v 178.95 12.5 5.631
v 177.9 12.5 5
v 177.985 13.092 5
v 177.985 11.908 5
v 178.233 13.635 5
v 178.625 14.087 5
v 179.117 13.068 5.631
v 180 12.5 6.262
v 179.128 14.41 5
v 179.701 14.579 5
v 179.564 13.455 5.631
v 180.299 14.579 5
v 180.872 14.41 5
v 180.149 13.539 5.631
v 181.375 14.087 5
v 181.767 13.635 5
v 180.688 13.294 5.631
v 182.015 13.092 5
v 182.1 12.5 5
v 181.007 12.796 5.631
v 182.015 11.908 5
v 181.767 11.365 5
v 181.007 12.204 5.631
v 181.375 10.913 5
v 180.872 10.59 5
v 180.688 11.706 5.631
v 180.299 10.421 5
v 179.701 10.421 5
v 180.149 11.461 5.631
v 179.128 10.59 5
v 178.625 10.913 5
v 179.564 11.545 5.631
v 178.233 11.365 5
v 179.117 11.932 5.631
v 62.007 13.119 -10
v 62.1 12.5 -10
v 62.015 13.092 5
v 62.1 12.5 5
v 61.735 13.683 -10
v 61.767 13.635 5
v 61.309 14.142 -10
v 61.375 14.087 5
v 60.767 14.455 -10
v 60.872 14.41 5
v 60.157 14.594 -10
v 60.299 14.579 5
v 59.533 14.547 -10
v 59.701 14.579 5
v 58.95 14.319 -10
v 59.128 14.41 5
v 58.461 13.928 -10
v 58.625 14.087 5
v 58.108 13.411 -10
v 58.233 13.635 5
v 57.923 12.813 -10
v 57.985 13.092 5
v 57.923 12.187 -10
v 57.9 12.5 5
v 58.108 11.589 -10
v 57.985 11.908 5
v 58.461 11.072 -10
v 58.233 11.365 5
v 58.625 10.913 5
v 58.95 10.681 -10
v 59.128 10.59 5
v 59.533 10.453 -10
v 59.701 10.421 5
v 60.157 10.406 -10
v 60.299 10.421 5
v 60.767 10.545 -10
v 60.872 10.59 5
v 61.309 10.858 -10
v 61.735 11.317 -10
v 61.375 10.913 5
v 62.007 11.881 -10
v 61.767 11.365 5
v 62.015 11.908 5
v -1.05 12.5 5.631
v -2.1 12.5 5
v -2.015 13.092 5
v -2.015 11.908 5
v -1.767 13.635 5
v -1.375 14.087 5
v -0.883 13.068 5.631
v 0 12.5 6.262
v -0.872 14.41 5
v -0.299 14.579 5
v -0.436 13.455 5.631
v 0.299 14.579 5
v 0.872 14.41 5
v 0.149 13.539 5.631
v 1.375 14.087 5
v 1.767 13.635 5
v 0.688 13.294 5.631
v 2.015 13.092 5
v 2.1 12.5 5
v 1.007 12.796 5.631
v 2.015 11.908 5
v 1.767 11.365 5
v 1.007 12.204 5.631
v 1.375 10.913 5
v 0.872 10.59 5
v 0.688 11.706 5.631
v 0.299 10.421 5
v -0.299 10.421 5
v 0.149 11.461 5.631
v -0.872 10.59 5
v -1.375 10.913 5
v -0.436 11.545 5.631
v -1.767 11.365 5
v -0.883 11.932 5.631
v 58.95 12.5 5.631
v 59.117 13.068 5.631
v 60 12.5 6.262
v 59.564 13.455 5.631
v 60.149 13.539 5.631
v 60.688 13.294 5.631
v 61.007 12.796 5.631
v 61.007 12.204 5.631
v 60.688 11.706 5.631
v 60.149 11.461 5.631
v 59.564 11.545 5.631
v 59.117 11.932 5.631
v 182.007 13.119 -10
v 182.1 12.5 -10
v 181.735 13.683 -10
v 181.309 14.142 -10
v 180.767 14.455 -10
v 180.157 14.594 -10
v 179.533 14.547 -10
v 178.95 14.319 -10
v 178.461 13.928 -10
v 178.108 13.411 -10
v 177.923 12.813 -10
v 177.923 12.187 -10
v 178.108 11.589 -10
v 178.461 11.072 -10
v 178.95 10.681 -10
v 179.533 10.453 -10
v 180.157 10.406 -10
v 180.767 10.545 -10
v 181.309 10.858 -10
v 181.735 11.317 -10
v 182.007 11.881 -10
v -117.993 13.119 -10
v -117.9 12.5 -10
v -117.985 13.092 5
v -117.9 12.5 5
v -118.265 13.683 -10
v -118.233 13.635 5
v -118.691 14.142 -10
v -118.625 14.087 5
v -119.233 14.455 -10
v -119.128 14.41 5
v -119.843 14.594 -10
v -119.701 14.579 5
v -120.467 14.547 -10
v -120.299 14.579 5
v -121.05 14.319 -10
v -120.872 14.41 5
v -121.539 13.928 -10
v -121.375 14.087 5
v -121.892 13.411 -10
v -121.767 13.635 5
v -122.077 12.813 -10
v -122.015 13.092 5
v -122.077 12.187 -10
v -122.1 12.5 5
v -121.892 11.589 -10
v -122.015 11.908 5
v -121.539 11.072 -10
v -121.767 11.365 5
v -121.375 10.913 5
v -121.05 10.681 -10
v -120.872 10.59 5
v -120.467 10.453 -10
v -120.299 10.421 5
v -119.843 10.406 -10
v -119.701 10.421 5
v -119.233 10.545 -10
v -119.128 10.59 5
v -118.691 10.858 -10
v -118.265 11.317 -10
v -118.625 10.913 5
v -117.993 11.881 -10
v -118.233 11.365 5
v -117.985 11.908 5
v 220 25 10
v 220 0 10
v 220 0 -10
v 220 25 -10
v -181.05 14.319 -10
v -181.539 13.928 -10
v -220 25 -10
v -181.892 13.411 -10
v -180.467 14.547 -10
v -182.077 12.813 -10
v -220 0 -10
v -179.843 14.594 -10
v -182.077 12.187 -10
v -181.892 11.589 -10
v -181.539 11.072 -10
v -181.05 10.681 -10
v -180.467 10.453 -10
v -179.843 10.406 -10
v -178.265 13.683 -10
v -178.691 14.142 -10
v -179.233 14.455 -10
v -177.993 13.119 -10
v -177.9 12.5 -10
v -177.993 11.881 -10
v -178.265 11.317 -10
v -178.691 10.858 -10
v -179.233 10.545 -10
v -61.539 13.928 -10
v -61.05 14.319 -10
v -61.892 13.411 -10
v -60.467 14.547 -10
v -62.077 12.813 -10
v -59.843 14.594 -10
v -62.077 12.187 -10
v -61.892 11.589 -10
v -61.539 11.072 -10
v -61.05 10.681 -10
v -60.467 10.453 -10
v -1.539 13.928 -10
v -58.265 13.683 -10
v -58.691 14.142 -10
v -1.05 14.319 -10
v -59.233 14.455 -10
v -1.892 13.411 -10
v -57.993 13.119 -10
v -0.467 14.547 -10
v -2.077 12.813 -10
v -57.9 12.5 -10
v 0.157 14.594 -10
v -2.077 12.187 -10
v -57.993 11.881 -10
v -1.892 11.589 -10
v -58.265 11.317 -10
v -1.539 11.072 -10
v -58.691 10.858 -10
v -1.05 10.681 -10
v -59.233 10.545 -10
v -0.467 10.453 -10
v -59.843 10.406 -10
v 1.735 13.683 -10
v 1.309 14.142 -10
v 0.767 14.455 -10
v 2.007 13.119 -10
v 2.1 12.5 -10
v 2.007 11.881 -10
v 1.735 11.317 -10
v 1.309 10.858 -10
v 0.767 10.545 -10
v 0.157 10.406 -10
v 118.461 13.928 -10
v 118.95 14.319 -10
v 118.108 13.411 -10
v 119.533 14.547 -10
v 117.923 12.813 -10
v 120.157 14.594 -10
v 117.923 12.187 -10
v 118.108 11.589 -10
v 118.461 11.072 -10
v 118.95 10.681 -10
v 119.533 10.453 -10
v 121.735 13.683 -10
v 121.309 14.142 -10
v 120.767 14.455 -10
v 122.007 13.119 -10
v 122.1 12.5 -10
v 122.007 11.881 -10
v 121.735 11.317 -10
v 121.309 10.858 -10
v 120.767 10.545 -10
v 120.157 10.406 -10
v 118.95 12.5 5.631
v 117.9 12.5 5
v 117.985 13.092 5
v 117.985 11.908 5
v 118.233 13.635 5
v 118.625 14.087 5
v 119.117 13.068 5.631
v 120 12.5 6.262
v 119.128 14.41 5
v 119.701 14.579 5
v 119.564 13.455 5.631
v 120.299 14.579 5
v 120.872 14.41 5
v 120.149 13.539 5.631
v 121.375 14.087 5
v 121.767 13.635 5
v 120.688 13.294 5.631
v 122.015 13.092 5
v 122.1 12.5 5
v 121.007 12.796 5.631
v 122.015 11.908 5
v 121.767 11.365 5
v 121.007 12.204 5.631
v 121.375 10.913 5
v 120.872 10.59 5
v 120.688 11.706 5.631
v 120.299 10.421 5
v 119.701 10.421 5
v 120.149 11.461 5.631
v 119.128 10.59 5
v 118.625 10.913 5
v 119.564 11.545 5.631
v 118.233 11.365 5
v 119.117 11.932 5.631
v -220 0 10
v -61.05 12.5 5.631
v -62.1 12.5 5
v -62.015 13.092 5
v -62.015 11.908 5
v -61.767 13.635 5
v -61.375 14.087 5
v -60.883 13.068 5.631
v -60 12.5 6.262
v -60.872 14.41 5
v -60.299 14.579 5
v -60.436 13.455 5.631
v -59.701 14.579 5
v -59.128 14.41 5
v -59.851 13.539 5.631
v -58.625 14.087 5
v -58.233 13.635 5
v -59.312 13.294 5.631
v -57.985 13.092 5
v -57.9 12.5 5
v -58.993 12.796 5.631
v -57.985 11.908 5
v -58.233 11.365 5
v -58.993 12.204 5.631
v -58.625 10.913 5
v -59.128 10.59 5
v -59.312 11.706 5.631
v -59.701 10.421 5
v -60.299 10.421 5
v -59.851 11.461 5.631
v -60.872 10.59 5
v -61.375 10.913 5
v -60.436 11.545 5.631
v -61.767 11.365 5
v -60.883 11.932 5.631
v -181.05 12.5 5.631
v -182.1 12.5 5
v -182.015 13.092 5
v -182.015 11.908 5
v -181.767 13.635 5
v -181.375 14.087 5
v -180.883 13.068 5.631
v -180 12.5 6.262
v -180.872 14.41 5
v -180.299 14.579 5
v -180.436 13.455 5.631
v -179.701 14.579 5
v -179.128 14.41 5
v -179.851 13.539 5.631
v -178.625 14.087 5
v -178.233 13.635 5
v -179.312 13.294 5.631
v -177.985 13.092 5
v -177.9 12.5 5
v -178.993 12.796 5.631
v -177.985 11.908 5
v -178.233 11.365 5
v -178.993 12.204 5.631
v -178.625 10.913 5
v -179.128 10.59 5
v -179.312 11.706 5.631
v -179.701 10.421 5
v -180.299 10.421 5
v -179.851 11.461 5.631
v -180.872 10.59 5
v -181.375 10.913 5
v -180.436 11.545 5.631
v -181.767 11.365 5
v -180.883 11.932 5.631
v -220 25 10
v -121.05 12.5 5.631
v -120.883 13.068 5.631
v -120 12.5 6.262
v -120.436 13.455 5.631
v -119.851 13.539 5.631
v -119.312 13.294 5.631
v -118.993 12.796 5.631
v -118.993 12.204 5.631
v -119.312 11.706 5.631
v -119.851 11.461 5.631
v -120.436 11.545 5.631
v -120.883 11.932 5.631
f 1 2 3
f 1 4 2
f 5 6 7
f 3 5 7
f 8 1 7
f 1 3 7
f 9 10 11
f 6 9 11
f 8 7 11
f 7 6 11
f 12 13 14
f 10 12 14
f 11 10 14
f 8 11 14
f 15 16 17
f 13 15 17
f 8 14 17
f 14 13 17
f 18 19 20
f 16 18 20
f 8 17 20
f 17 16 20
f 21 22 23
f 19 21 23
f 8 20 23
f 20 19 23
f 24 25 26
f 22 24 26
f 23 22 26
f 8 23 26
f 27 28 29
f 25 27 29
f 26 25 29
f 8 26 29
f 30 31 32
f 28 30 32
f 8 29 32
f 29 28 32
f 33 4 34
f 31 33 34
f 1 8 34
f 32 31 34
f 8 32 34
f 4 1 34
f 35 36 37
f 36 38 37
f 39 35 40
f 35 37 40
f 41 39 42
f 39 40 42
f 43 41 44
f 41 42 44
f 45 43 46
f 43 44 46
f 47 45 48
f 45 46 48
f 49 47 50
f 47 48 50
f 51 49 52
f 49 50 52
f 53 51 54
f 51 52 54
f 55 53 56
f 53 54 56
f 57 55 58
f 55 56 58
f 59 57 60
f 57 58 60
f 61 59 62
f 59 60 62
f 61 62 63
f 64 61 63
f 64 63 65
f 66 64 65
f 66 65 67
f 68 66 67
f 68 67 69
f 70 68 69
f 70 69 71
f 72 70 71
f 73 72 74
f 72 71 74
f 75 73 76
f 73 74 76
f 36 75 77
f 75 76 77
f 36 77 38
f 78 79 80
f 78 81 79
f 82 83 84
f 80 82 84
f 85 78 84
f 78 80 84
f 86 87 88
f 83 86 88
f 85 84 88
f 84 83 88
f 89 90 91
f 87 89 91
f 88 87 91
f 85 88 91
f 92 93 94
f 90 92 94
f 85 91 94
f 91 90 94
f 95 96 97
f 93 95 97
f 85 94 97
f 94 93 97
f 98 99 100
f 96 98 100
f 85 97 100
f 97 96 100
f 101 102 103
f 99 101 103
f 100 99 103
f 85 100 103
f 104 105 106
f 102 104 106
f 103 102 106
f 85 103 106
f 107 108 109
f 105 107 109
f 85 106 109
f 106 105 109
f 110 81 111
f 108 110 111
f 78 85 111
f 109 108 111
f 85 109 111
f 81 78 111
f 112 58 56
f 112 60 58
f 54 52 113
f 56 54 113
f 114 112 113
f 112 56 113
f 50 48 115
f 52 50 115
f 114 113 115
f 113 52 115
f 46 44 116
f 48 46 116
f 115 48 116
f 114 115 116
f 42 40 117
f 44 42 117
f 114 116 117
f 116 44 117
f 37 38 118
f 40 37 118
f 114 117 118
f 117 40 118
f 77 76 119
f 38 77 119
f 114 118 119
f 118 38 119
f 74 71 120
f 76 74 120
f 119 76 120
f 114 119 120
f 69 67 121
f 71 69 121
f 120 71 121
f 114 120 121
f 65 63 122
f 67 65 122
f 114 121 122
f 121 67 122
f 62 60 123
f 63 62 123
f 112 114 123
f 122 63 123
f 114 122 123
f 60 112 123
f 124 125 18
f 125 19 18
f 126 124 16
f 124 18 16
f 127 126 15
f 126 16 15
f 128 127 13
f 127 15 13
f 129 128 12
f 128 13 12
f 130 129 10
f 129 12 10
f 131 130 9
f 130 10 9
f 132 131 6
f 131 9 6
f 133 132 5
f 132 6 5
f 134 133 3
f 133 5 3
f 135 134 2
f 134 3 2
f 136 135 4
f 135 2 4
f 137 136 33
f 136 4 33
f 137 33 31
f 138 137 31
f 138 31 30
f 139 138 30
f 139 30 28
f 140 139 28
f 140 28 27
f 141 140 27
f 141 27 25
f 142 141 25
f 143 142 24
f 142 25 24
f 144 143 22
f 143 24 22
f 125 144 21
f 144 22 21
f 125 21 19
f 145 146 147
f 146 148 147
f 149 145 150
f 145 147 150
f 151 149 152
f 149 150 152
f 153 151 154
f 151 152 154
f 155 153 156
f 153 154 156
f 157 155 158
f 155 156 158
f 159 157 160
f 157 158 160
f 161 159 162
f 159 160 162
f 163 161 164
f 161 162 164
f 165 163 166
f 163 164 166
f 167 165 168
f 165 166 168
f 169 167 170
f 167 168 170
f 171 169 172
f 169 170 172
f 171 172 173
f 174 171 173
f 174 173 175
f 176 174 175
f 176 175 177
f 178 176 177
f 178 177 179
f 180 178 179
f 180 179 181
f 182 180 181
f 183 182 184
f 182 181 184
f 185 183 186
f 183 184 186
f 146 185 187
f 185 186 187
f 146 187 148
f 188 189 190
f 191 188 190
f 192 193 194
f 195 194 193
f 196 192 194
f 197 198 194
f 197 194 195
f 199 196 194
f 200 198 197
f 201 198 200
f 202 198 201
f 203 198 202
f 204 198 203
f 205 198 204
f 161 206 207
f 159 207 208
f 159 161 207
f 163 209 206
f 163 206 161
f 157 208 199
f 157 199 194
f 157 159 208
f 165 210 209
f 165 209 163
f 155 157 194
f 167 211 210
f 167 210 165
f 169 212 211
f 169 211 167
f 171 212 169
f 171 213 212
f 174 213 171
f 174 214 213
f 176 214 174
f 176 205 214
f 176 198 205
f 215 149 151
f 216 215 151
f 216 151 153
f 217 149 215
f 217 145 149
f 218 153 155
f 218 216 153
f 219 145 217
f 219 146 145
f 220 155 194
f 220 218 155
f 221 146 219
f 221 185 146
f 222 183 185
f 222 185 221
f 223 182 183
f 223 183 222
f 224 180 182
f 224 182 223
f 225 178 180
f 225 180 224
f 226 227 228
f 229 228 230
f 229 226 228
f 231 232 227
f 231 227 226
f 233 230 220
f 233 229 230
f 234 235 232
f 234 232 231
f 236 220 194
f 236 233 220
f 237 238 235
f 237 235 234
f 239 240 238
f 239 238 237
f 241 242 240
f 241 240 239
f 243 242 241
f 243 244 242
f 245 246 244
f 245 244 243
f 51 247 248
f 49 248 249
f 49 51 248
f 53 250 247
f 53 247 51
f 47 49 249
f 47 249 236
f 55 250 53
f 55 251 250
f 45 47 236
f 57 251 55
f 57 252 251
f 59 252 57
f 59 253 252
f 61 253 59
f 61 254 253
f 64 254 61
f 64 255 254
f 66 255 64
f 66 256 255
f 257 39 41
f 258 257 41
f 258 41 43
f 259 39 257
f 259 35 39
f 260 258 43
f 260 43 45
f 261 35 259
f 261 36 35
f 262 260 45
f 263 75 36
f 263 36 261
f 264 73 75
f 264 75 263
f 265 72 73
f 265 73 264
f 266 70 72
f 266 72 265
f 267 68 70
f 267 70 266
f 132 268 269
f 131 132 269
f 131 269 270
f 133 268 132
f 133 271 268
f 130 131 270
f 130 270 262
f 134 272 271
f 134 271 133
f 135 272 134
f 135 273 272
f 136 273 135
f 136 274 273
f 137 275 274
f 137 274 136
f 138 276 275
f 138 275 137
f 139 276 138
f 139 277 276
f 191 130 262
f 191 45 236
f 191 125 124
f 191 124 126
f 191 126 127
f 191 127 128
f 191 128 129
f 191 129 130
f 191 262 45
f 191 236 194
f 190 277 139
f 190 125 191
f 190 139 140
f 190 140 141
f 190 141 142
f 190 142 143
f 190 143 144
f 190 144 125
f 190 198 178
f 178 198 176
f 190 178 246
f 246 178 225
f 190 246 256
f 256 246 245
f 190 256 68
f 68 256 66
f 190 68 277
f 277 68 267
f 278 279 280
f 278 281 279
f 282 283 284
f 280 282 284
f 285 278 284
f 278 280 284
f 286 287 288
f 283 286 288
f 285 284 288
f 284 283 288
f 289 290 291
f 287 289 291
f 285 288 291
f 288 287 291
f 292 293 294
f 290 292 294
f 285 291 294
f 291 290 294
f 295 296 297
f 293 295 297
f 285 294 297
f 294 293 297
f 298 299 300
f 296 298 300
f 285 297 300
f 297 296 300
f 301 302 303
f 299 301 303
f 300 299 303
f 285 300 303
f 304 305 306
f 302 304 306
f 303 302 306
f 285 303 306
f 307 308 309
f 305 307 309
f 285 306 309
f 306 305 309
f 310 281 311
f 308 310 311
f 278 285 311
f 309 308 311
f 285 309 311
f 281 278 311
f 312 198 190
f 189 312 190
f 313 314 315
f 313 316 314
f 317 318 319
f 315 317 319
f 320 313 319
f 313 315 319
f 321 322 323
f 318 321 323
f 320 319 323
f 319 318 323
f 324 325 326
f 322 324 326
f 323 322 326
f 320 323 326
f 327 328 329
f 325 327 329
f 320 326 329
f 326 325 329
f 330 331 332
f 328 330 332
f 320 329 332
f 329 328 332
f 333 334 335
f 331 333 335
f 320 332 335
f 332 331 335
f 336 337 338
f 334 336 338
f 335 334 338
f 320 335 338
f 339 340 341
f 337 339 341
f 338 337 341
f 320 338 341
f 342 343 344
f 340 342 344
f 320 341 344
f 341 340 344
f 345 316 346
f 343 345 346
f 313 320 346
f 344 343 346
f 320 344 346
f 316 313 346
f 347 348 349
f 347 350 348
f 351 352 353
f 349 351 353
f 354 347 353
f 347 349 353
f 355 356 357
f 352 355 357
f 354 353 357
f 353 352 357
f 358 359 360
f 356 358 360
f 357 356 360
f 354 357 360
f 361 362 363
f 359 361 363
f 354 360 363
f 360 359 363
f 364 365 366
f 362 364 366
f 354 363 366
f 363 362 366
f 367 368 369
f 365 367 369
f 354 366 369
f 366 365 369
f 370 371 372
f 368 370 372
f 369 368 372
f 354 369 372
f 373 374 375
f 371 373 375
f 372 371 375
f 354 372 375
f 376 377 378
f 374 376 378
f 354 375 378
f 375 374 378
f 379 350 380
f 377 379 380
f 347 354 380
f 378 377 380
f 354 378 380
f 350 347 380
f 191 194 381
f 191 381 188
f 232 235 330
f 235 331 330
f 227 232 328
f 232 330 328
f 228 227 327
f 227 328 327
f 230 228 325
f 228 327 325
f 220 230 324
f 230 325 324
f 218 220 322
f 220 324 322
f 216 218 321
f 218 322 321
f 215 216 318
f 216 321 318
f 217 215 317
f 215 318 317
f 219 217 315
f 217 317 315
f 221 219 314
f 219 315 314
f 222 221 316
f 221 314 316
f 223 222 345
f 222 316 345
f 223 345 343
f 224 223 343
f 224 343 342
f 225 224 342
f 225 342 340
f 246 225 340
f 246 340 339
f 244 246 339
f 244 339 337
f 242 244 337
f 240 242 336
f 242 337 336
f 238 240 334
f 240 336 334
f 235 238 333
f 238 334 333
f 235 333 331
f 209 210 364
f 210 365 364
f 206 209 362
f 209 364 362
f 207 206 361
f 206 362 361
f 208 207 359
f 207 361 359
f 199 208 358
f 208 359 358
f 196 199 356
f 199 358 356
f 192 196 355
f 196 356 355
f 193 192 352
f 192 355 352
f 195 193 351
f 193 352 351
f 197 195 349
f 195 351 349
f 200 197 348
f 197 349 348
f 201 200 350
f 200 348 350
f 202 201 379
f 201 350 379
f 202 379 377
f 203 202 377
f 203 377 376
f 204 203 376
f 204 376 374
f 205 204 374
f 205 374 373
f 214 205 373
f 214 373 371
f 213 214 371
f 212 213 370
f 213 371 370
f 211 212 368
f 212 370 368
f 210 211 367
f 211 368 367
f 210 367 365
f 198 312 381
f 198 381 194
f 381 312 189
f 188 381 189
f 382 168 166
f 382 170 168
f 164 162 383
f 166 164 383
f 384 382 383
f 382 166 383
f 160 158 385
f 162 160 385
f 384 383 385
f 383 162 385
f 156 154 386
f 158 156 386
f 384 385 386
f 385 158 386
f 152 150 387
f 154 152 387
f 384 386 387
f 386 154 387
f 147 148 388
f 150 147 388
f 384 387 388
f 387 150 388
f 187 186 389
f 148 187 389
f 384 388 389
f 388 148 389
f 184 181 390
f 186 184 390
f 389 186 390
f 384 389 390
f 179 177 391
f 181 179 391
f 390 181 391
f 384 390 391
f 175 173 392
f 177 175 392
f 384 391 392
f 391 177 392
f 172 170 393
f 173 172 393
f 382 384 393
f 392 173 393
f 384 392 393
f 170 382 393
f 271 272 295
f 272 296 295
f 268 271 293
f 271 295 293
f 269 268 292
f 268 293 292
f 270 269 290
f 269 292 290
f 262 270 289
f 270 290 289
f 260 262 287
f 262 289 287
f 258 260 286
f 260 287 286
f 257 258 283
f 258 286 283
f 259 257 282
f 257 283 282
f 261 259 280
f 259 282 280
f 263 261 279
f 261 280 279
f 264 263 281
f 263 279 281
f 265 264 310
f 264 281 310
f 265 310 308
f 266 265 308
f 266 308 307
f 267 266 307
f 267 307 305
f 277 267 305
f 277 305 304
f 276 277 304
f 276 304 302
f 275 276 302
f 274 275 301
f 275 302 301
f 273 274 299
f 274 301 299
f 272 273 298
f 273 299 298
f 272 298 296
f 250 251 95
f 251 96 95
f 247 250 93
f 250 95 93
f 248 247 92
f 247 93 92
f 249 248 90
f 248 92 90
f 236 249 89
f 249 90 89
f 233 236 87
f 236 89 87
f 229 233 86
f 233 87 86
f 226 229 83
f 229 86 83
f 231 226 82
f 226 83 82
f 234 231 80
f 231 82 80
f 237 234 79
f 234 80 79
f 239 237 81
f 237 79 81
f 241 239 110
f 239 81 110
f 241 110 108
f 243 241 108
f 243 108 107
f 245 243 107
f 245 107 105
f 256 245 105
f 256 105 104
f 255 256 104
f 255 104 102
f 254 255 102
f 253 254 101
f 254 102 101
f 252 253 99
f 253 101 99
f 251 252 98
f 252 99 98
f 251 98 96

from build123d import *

# Parameters (mm, degrees)
SKETCH1_W             = 440
SKETCH1_H             = 20
BOSS_EXTRUDE1_DEPTH   = 25
M5_TAPPED_HOLE1_D     = 4.2
M5_TAPPED_HOLE1_DEPTH = 15
M5_TAPPED_HOLE1_TIP   = 1.2618073


with BuildPart() as part:
    # Sketch1 → Boss-Extrude1 (new body)
    with BuildSketch(Plane(origin=(0, 0, 0), x_dir=(1, 0, 0), z_dir=(0, 1, 0))):
        Rectangle(SKETCH1_W, SKETCH1_H)
    extrude(amount=BOSS_EXTRUDE1_DEPTH)

    # M5 Tapped Hole1
    with Locations(Plane(origin=(0, 0, -10), x_dir=(-1, 0, 0), z_dir=(0, 0, -1))):
        with Locations((0, 12.5), (60, 12.5), (120, 12.5), (180, 12.5), (-60, 12.5), (-120, 12.5), (-180, 12.5)):
            Hole(M5_TAPPED_HOLE1_D / 2, depth=M5_TAPPED_HOLE1_DEPTH)
            with Locations((0, 0, -(M5_TAPPED_HOLE1_DEPTH + M5_TAPPED_HOLE1_TIP / 2))):  # 118° drill point
                Cone(0, M5_TAPPED_HOLE1_D / 2, M5_TAPPED_HOLE1_TIP, mode=Mode.SUBTRACT)


solid = part.part
